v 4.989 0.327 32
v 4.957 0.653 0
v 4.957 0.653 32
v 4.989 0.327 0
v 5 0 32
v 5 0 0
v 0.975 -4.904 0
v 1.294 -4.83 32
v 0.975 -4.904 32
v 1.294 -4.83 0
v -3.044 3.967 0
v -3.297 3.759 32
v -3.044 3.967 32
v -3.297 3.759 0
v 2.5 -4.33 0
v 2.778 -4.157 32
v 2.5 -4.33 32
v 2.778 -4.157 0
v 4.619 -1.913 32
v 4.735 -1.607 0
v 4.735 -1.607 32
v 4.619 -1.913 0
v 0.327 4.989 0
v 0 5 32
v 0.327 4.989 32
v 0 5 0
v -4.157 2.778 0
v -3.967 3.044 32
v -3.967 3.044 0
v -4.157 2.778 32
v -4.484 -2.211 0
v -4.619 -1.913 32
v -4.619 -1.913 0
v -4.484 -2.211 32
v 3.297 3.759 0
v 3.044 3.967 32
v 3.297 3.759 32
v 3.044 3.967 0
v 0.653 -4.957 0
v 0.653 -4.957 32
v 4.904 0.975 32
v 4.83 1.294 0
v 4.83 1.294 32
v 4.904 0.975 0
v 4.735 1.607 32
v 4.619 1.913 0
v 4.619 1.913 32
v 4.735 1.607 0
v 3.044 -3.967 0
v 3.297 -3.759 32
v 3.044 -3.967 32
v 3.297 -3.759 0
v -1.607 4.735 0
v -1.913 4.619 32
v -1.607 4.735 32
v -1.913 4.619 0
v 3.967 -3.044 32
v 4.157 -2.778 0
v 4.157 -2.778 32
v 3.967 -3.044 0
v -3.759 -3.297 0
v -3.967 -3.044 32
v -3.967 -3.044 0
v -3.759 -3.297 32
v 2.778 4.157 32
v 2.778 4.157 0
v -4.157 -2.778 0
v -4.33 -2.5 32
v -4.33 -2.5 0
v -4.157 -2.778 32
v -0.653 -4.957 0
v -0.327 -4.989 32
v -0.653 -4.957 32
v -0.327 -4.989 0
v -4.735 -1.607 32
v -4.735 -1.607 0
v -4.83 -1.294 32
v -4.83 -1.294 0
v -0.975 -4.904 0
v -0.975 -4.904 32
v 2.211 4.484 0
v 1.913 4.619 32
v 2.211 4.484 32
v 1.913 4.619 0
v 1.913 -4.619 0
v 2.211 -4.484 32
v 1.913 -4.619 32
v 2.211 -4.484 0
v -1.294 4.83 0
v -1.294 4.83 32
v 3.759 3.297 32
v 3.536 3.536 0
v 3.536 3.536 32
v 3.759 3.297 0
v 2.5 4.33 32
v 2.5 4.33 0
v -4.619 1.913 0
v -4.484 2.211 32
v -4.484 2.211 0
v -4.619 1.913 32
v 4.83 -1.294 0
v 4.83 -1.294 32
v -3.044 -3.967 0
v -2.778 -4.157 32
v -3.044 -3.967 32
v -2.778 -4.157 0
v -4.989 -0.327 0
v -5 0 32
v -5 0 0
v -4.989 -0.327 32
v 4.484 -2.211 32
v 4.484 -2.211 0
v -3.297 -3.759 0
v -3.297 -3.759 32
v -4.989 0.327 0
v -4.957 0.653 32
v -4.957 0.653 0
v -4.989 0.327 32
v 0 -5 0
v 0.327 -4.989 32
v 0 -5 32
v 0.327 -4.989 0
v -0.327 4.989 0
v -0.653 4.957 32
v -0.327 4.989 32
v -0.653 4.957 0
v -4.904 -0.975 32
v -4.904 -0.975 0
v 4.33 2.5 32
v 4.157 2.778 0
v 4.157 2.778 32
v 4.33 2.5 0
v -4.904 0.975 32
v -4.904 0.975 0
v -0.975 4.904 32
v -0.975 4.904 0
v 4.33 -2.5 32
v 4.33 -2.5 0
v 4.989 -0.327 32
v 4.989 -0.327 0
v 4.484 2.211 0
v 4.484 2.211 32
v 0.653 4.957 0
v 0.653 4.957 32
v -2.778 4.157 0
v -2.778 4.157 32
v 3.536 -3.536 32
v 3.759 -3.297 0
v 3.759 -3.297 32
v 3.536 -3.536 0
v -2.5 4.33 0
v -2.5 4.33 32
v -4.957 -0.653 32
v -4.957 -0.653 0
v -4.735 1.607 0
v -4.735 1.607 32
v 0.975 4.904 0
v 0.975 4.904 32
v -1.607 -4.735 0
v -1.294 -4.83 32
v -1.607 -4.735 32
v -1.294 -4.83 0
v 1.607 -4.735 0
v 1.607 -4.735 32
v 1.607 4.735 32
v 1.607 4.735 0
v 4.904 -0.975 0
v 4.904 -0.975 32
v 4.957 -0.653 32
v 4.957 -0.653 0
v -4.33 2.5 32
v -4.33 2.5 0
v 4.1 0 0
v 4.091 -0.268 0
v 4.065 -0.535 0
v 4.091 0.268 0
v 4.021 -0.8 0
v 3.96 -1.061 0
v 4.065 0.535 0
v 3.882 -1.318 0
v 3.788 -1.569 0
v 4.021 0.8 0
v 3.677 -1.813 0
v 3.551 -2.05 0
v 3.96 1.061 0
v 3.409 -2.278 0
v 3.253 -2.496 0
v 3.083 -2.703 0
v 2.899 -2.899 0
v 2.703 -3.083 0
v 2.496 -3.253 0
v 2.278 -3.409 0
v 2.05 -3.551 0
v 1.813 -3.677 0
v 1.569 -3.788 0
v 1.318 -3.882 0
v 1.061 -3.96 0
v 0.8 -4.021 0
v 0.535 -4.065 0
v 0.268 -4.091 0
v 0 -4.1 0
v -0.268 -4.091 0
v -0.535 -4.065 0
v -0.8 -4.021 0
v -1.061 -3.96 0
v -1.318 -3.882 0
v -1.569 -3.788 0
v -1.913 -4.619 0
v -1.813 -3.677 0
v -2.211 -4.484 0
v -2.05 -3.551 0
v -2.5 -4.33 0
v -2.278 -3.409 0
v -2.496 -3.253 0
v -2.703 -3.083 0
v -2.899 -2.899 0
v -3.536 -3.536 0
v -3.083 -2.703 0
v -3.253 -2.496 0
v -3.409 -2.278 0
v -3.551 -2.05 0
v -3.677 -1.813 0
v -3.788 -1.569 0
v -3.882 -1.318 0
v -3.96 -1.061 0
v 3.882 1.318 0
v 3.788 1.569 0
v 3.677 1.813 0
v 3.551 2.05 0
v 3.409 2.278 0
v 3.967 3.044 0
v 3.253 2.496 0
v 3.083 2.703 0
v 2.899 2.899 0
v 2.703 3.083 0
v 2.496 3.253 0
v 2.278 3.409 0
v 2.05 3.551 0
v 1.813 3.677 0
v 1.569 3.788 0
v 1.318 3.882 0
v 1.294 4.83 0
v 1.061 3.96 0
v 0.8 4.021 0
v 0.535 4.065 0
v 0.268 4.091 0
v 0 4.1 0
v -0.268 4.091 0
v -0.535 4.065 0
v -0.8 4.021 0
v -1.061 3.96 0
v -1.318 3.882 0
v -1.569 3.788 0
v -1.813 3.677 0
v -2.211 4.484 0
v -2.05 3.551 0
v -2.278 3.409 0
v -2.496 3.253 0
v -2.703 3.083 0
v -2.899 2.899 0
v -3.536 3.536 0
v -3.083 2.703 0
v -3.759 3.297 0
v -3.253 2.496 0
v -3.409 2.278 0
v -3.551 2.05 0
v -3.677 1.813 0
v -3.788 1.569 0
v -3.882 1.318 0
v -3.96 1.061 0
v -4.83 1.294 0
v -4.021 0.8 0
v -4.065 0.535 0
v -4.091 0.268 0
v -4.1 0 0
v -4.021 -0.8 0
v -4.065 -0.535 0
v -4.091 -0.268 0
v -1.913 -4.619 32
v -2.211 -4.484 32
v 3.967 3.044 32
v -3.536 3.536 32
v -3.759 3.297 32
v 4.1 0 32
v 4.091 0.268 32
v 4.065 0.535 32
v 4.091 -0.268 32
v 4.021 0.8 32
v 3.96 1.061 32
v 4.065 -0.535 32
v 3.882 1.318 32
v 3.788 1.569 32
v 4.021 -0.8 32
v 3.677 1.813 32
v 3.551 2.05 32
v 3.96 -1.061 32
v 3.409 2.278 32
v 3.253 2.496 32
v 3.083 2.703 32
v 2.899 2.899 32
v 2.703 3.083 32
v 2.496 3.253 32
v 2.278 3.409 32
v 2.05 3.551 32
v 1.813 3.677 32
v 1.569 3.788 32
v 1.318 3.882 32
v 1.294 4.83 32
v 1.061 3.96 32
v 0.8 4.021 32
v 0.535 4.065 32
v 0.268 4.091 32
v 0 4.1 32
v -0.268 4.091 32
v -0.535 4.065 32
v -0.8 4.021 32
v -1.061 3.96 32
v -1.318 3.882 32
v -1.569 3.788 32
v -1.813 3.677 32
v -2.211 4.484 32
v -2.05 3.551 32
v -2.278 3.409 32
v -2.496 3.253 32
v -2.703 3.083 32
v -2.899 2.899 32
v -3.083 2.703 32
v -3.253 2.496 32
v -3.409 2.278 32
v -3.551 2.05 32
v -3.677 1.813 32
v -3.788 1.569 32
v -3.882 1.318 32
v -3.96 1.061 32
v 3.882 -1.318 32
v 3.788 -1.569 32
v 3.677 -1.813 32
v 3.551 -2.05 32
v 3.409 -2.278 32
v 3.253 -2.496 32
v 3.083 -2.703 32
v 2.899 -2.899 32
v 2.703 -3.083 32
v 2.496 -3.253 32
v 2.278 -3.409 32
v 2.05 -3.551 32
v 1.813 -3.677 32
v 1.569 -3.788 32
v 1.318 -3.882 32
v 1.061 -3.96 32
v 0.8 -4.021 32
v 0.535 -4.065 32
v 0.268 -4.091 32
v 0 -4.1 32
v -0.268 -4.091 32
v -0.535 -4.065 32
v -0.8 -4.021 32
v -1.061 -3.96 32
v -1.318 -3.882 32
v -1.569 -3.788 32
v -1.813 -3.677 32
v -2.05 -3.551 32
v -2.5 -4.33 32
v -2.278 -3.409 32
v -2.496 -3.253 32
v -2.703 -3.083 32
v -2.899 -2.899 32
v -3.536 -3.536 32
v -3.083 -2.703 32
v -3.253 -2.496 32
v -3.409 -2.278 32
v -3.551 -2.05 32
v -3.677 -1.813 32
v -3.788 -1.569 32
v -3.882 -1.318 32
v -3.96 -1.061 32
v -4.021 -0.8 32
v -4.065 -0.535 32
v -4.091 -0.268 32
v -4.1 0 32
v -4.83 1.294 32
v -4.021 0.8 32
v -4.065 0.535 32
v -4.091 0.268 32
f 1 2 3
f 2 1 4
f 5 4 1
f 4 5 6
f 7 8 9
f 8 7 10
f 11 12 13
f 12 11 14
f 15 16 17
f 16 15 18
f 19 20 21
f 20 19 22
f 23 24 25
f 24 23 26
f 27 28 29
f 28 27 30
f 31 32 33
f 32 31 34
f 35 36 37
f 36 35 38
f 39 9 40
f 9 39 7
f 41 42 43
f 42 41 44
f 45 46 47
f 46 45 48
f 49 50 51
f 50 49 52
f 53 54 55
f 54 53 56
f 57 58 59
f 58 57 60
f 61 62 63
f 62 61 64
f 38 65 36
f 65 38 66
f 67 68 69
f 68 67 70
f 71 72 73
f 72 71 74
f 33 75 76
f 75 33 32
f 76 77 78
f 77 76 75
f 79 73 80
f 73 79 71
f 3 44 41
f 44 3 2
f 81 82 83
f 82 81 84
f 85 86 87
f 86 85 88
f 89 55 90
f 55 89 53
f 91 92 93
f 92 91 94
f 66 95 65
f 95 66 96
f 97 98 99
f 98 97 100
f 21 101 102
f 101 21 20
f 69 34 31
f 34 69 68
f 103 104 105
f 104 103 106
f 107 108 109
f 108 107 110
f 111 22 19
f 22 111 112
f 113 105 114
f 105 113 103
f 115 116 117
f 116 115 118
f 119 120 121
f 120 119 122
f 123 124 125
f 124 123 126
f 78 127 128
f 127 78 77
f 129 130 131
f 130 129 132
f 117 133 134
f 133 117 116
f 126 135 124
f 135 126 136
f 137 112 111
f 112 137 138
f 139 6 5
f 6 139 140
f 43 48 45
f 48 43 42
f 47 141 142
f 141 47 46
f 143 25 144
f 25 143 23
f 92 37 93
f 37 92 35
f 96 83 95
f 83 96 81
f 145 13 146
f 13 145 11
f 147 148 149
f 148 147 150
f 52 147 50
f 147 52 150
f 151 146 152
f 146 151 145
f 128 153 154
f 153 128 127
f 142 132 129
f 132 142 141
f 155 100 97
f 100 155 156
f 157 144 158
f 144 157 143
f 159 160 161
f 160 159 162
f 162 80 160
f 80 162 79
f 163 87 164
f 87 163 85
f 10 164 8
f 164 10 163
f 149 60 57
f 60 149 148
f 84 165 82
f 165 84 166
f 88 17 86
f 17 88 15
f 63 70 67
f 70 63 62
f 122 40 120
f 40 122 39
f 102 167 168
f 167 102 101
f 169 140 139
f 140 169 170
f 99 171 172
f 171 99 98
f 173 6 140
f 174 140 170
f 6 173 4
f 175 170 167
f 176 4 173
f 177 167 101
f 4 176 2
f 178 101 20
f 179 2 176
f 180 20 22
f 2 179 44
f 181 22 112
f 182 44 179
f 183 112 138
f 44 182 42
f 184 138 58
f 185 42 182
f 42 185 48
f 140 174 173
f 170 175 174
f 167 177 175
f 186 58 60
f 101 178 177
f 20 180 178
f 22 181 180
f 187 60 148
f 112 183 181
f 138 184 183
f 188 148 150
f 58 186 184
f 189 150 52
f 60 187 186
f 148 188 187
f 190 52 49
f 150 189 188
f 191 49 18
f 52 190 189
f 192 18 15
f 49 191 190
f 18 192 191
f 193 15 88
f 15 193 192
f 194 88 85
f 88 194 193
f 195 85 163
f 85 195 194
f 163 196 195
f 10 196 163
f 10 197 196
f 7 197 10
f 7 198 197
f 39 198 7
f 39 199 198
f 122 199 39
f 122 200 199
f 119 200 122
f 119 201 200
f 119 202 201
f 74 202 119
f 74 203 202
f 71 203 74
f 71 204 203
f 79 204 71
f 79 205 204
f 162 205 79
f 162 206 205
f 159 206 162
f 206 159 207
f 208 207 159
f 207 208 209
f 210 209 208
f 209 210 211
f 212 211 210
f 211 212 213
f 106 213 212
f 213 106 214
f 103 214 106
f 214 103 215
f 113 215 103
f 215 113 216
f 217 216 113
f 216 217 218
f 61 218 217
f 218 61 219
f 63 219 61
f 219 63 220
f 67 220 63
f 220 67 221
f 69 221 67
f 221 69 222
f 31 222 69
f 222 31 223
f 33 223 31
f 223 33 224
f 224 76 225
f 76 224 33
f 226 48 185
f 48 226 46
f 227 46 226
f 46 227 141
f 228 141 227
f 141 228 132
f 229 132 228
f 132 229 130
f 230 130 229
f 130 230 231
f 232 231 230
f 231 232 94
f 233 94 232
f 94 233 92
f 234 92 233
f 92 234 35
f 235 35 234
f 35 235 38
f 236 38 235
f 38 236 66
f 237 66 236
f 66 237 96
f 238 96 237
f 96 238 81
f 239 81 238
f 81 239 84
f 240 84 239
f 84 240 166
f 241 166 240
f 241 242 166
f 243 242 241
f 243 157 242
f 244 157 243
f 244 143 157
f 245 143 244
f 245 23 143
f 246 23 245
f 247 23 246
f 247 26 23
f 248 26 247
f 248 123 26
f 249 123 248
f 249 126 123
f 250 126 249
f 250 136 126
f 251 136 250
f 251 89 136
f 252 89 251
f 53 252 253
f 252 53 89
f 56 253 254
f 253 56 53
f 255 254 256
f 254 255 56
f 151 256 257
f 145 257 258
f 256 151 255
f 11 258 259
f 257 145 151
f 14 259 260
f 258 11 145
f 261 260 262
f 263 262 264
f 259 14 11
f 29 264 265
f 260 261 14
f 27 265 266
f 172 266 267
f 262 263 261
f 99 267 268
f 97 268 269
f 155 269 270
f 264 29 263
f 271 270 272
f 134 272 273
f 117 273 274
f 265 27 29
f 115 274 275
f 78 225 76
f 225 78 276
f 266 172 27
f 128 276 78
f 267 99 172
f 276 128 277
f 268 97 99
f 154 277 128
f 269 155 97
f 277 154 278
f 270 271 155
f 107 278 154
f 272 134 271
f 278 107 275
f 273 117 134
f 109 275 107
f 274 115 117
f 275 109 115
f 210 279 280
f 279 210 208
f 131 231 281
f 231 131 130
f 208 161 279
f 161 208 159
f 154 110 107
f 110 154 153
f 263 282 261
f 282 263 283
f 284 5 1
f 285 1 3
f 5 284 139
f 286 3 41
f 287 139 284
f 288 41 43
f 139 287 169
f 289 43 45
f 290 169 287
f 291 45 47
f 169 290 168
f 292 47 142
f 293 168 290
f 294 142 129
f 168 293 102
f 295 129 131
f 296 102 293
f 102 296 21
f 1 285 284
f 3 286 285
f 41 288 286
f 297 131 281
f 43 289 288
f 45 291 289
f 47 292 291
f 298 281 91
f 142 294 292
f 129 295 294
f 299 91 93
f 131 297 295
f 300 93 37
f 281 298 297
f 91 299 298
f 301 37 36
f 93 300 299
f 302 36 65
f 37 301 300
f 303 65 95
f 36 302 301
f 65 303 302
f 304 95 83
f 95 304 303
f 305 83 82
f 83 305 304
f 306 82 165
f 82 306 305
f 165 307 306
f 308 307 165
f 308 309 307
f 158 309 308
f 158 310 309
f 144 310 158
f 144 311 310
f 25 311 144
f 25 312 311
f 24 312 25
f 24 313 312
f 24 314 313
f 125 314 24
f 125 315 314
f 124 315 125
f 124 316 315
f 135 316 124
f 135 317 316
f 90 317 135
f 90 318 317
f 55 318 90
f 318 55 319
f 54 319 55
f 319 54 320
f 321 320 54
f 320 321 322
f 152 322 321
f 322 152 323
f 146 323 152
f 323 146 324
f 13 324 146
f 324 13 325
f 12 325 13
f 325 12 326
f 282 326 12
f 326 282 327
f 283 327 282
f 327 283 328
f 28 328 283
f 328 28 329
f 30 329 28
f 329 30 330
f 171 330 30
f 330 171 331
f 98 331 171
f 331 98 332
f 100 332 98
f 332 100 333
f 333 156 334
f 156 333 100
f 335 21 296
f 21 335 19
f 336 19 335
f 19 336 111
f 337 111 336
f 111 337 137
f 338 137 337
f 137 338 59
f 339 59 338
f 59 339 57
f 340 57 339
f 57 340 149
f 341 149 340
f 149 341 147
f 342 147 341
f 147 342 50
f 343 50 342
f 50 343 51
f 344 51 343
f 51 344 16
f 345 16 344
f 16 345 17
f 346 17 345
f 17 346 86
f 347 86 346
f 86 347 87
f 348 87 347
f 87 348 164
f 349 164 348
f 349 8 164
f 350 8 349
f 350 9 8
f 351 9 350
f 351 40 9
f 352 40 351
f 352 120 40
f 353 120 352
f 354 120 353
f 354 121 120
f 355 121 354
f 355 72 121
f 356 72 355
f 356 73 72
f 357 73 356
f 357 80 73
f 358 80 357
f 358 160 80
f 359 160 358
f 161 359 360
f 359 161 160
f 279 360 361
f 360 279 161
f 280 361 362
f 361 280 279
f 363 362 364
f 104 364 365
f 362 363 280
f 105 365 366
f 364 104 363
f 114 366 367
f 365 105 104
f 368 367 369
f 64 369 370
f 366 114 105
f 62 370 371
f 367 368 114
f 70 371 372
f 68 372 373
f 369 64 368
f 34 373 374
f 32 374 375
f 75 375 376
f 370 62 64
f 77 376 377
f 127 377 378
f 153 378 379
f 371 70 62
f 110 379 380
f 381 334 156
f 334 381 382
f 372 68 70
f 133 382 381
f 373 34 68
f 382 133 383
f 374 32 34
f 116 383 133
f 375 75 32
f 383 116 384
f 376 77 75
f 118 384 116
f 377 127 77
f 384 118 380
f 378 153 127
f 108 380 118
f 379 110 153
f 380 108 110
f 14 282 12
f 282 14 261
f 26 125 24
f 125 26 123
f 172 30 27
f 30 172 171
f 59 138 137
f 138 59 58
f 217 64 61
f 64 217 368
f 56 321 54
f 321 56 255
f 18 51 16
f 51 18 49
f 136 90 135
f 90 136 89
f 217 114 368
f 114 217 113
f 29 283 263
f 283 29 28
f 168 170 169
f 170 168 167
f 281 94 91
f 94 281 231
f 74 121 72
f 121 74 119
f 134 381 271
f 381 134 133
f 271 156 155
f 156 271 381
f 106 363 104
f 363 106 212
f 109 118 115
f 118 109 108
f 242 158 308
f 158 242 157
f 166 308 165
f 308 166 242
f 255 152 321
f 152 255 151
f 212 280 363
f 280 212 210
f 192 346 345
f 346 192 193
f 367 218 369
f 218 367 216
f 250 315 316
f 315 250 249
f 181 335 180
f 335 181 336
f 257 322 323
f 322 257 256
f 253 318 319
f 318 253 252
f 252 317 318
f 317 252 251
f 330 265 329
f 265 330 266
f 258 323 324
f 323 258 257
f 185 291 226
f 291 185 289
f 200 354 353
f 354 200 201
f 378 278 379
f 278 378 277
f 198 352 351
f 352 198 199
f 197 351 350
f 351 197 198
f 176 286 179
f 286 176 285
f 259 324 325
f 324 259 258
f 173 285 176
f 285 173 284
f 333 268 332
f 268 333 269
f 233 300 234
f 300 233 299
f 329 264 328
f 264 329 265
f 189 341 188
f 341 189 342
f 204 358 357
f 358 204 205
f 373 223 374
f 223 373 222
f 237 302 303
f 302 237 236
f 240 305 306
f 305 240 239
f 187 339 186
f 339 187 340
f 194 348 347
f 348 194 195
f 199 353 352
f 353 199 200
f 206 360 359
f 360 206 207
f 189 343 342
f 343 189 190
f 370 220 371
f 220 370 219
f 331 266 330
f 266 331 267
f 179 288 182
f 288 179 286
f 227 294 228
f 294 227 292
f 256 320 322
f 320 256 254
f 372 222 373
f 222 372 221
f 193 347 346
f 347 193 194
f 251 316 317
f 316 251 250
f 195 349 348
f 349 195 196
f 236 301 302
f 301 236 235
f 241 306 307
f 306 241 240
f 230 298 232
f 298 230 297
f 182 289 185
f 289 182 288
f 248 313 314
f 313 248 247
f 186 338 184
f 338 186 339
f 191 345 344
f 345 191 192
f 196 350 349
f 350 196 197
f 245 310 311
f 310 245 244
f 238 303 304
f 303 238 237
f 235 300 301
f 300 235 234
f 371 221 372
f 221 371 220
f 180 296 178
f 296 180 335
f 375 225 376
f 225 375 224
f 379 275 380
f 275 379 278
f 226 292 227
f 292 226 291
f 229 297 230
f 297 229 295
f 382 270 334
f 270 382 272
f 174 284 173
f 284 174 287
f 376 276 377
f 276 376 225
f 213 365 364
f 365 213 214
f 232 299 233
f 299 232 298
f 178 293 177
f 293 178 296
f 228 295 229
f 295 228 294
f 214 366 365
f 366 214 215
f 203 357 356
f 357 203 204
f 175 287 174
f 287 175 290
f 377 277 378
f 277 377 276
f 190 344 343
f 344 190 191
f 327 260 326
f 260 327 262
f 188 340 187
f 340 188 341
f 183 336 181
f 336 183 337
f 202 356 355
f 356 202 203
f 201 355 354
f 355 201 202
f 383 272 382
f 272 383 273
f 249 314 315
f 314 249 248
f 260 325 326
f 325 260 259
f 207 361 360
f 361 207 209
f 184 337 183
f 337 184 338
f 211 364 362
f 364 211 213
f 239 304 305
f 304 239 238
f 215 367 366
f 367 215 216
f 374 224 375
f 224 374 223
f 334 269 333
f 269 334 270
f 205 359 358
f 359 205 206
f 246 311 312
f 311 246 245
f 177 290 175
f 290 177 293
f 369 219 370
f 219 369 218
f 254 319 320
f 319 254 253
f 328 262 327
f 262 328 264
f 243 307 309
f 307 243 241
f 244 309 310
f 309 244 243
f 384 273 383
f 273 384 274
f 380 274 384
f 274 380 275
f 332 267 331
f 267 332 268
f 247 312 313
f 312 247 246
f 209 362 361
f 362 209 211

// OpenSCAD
// All measurements in MM
// Inner diameter
ind =8.2;

// Outer diameter bottom
od1=10;

// Outer diameter top 
od2=10;

// Cylinder hight 
ch=32;

translate([0, 0, 0]) {
    difference() {
		translate([0, 0, 0]) cylinder(h = ch, r1 =od1/2,r2=od2/2,$fn=96);  //cylinder
		translate([0, 0, 0]) cylinder(h = ch, r= ind/2, $fn=96);               
    }
}
